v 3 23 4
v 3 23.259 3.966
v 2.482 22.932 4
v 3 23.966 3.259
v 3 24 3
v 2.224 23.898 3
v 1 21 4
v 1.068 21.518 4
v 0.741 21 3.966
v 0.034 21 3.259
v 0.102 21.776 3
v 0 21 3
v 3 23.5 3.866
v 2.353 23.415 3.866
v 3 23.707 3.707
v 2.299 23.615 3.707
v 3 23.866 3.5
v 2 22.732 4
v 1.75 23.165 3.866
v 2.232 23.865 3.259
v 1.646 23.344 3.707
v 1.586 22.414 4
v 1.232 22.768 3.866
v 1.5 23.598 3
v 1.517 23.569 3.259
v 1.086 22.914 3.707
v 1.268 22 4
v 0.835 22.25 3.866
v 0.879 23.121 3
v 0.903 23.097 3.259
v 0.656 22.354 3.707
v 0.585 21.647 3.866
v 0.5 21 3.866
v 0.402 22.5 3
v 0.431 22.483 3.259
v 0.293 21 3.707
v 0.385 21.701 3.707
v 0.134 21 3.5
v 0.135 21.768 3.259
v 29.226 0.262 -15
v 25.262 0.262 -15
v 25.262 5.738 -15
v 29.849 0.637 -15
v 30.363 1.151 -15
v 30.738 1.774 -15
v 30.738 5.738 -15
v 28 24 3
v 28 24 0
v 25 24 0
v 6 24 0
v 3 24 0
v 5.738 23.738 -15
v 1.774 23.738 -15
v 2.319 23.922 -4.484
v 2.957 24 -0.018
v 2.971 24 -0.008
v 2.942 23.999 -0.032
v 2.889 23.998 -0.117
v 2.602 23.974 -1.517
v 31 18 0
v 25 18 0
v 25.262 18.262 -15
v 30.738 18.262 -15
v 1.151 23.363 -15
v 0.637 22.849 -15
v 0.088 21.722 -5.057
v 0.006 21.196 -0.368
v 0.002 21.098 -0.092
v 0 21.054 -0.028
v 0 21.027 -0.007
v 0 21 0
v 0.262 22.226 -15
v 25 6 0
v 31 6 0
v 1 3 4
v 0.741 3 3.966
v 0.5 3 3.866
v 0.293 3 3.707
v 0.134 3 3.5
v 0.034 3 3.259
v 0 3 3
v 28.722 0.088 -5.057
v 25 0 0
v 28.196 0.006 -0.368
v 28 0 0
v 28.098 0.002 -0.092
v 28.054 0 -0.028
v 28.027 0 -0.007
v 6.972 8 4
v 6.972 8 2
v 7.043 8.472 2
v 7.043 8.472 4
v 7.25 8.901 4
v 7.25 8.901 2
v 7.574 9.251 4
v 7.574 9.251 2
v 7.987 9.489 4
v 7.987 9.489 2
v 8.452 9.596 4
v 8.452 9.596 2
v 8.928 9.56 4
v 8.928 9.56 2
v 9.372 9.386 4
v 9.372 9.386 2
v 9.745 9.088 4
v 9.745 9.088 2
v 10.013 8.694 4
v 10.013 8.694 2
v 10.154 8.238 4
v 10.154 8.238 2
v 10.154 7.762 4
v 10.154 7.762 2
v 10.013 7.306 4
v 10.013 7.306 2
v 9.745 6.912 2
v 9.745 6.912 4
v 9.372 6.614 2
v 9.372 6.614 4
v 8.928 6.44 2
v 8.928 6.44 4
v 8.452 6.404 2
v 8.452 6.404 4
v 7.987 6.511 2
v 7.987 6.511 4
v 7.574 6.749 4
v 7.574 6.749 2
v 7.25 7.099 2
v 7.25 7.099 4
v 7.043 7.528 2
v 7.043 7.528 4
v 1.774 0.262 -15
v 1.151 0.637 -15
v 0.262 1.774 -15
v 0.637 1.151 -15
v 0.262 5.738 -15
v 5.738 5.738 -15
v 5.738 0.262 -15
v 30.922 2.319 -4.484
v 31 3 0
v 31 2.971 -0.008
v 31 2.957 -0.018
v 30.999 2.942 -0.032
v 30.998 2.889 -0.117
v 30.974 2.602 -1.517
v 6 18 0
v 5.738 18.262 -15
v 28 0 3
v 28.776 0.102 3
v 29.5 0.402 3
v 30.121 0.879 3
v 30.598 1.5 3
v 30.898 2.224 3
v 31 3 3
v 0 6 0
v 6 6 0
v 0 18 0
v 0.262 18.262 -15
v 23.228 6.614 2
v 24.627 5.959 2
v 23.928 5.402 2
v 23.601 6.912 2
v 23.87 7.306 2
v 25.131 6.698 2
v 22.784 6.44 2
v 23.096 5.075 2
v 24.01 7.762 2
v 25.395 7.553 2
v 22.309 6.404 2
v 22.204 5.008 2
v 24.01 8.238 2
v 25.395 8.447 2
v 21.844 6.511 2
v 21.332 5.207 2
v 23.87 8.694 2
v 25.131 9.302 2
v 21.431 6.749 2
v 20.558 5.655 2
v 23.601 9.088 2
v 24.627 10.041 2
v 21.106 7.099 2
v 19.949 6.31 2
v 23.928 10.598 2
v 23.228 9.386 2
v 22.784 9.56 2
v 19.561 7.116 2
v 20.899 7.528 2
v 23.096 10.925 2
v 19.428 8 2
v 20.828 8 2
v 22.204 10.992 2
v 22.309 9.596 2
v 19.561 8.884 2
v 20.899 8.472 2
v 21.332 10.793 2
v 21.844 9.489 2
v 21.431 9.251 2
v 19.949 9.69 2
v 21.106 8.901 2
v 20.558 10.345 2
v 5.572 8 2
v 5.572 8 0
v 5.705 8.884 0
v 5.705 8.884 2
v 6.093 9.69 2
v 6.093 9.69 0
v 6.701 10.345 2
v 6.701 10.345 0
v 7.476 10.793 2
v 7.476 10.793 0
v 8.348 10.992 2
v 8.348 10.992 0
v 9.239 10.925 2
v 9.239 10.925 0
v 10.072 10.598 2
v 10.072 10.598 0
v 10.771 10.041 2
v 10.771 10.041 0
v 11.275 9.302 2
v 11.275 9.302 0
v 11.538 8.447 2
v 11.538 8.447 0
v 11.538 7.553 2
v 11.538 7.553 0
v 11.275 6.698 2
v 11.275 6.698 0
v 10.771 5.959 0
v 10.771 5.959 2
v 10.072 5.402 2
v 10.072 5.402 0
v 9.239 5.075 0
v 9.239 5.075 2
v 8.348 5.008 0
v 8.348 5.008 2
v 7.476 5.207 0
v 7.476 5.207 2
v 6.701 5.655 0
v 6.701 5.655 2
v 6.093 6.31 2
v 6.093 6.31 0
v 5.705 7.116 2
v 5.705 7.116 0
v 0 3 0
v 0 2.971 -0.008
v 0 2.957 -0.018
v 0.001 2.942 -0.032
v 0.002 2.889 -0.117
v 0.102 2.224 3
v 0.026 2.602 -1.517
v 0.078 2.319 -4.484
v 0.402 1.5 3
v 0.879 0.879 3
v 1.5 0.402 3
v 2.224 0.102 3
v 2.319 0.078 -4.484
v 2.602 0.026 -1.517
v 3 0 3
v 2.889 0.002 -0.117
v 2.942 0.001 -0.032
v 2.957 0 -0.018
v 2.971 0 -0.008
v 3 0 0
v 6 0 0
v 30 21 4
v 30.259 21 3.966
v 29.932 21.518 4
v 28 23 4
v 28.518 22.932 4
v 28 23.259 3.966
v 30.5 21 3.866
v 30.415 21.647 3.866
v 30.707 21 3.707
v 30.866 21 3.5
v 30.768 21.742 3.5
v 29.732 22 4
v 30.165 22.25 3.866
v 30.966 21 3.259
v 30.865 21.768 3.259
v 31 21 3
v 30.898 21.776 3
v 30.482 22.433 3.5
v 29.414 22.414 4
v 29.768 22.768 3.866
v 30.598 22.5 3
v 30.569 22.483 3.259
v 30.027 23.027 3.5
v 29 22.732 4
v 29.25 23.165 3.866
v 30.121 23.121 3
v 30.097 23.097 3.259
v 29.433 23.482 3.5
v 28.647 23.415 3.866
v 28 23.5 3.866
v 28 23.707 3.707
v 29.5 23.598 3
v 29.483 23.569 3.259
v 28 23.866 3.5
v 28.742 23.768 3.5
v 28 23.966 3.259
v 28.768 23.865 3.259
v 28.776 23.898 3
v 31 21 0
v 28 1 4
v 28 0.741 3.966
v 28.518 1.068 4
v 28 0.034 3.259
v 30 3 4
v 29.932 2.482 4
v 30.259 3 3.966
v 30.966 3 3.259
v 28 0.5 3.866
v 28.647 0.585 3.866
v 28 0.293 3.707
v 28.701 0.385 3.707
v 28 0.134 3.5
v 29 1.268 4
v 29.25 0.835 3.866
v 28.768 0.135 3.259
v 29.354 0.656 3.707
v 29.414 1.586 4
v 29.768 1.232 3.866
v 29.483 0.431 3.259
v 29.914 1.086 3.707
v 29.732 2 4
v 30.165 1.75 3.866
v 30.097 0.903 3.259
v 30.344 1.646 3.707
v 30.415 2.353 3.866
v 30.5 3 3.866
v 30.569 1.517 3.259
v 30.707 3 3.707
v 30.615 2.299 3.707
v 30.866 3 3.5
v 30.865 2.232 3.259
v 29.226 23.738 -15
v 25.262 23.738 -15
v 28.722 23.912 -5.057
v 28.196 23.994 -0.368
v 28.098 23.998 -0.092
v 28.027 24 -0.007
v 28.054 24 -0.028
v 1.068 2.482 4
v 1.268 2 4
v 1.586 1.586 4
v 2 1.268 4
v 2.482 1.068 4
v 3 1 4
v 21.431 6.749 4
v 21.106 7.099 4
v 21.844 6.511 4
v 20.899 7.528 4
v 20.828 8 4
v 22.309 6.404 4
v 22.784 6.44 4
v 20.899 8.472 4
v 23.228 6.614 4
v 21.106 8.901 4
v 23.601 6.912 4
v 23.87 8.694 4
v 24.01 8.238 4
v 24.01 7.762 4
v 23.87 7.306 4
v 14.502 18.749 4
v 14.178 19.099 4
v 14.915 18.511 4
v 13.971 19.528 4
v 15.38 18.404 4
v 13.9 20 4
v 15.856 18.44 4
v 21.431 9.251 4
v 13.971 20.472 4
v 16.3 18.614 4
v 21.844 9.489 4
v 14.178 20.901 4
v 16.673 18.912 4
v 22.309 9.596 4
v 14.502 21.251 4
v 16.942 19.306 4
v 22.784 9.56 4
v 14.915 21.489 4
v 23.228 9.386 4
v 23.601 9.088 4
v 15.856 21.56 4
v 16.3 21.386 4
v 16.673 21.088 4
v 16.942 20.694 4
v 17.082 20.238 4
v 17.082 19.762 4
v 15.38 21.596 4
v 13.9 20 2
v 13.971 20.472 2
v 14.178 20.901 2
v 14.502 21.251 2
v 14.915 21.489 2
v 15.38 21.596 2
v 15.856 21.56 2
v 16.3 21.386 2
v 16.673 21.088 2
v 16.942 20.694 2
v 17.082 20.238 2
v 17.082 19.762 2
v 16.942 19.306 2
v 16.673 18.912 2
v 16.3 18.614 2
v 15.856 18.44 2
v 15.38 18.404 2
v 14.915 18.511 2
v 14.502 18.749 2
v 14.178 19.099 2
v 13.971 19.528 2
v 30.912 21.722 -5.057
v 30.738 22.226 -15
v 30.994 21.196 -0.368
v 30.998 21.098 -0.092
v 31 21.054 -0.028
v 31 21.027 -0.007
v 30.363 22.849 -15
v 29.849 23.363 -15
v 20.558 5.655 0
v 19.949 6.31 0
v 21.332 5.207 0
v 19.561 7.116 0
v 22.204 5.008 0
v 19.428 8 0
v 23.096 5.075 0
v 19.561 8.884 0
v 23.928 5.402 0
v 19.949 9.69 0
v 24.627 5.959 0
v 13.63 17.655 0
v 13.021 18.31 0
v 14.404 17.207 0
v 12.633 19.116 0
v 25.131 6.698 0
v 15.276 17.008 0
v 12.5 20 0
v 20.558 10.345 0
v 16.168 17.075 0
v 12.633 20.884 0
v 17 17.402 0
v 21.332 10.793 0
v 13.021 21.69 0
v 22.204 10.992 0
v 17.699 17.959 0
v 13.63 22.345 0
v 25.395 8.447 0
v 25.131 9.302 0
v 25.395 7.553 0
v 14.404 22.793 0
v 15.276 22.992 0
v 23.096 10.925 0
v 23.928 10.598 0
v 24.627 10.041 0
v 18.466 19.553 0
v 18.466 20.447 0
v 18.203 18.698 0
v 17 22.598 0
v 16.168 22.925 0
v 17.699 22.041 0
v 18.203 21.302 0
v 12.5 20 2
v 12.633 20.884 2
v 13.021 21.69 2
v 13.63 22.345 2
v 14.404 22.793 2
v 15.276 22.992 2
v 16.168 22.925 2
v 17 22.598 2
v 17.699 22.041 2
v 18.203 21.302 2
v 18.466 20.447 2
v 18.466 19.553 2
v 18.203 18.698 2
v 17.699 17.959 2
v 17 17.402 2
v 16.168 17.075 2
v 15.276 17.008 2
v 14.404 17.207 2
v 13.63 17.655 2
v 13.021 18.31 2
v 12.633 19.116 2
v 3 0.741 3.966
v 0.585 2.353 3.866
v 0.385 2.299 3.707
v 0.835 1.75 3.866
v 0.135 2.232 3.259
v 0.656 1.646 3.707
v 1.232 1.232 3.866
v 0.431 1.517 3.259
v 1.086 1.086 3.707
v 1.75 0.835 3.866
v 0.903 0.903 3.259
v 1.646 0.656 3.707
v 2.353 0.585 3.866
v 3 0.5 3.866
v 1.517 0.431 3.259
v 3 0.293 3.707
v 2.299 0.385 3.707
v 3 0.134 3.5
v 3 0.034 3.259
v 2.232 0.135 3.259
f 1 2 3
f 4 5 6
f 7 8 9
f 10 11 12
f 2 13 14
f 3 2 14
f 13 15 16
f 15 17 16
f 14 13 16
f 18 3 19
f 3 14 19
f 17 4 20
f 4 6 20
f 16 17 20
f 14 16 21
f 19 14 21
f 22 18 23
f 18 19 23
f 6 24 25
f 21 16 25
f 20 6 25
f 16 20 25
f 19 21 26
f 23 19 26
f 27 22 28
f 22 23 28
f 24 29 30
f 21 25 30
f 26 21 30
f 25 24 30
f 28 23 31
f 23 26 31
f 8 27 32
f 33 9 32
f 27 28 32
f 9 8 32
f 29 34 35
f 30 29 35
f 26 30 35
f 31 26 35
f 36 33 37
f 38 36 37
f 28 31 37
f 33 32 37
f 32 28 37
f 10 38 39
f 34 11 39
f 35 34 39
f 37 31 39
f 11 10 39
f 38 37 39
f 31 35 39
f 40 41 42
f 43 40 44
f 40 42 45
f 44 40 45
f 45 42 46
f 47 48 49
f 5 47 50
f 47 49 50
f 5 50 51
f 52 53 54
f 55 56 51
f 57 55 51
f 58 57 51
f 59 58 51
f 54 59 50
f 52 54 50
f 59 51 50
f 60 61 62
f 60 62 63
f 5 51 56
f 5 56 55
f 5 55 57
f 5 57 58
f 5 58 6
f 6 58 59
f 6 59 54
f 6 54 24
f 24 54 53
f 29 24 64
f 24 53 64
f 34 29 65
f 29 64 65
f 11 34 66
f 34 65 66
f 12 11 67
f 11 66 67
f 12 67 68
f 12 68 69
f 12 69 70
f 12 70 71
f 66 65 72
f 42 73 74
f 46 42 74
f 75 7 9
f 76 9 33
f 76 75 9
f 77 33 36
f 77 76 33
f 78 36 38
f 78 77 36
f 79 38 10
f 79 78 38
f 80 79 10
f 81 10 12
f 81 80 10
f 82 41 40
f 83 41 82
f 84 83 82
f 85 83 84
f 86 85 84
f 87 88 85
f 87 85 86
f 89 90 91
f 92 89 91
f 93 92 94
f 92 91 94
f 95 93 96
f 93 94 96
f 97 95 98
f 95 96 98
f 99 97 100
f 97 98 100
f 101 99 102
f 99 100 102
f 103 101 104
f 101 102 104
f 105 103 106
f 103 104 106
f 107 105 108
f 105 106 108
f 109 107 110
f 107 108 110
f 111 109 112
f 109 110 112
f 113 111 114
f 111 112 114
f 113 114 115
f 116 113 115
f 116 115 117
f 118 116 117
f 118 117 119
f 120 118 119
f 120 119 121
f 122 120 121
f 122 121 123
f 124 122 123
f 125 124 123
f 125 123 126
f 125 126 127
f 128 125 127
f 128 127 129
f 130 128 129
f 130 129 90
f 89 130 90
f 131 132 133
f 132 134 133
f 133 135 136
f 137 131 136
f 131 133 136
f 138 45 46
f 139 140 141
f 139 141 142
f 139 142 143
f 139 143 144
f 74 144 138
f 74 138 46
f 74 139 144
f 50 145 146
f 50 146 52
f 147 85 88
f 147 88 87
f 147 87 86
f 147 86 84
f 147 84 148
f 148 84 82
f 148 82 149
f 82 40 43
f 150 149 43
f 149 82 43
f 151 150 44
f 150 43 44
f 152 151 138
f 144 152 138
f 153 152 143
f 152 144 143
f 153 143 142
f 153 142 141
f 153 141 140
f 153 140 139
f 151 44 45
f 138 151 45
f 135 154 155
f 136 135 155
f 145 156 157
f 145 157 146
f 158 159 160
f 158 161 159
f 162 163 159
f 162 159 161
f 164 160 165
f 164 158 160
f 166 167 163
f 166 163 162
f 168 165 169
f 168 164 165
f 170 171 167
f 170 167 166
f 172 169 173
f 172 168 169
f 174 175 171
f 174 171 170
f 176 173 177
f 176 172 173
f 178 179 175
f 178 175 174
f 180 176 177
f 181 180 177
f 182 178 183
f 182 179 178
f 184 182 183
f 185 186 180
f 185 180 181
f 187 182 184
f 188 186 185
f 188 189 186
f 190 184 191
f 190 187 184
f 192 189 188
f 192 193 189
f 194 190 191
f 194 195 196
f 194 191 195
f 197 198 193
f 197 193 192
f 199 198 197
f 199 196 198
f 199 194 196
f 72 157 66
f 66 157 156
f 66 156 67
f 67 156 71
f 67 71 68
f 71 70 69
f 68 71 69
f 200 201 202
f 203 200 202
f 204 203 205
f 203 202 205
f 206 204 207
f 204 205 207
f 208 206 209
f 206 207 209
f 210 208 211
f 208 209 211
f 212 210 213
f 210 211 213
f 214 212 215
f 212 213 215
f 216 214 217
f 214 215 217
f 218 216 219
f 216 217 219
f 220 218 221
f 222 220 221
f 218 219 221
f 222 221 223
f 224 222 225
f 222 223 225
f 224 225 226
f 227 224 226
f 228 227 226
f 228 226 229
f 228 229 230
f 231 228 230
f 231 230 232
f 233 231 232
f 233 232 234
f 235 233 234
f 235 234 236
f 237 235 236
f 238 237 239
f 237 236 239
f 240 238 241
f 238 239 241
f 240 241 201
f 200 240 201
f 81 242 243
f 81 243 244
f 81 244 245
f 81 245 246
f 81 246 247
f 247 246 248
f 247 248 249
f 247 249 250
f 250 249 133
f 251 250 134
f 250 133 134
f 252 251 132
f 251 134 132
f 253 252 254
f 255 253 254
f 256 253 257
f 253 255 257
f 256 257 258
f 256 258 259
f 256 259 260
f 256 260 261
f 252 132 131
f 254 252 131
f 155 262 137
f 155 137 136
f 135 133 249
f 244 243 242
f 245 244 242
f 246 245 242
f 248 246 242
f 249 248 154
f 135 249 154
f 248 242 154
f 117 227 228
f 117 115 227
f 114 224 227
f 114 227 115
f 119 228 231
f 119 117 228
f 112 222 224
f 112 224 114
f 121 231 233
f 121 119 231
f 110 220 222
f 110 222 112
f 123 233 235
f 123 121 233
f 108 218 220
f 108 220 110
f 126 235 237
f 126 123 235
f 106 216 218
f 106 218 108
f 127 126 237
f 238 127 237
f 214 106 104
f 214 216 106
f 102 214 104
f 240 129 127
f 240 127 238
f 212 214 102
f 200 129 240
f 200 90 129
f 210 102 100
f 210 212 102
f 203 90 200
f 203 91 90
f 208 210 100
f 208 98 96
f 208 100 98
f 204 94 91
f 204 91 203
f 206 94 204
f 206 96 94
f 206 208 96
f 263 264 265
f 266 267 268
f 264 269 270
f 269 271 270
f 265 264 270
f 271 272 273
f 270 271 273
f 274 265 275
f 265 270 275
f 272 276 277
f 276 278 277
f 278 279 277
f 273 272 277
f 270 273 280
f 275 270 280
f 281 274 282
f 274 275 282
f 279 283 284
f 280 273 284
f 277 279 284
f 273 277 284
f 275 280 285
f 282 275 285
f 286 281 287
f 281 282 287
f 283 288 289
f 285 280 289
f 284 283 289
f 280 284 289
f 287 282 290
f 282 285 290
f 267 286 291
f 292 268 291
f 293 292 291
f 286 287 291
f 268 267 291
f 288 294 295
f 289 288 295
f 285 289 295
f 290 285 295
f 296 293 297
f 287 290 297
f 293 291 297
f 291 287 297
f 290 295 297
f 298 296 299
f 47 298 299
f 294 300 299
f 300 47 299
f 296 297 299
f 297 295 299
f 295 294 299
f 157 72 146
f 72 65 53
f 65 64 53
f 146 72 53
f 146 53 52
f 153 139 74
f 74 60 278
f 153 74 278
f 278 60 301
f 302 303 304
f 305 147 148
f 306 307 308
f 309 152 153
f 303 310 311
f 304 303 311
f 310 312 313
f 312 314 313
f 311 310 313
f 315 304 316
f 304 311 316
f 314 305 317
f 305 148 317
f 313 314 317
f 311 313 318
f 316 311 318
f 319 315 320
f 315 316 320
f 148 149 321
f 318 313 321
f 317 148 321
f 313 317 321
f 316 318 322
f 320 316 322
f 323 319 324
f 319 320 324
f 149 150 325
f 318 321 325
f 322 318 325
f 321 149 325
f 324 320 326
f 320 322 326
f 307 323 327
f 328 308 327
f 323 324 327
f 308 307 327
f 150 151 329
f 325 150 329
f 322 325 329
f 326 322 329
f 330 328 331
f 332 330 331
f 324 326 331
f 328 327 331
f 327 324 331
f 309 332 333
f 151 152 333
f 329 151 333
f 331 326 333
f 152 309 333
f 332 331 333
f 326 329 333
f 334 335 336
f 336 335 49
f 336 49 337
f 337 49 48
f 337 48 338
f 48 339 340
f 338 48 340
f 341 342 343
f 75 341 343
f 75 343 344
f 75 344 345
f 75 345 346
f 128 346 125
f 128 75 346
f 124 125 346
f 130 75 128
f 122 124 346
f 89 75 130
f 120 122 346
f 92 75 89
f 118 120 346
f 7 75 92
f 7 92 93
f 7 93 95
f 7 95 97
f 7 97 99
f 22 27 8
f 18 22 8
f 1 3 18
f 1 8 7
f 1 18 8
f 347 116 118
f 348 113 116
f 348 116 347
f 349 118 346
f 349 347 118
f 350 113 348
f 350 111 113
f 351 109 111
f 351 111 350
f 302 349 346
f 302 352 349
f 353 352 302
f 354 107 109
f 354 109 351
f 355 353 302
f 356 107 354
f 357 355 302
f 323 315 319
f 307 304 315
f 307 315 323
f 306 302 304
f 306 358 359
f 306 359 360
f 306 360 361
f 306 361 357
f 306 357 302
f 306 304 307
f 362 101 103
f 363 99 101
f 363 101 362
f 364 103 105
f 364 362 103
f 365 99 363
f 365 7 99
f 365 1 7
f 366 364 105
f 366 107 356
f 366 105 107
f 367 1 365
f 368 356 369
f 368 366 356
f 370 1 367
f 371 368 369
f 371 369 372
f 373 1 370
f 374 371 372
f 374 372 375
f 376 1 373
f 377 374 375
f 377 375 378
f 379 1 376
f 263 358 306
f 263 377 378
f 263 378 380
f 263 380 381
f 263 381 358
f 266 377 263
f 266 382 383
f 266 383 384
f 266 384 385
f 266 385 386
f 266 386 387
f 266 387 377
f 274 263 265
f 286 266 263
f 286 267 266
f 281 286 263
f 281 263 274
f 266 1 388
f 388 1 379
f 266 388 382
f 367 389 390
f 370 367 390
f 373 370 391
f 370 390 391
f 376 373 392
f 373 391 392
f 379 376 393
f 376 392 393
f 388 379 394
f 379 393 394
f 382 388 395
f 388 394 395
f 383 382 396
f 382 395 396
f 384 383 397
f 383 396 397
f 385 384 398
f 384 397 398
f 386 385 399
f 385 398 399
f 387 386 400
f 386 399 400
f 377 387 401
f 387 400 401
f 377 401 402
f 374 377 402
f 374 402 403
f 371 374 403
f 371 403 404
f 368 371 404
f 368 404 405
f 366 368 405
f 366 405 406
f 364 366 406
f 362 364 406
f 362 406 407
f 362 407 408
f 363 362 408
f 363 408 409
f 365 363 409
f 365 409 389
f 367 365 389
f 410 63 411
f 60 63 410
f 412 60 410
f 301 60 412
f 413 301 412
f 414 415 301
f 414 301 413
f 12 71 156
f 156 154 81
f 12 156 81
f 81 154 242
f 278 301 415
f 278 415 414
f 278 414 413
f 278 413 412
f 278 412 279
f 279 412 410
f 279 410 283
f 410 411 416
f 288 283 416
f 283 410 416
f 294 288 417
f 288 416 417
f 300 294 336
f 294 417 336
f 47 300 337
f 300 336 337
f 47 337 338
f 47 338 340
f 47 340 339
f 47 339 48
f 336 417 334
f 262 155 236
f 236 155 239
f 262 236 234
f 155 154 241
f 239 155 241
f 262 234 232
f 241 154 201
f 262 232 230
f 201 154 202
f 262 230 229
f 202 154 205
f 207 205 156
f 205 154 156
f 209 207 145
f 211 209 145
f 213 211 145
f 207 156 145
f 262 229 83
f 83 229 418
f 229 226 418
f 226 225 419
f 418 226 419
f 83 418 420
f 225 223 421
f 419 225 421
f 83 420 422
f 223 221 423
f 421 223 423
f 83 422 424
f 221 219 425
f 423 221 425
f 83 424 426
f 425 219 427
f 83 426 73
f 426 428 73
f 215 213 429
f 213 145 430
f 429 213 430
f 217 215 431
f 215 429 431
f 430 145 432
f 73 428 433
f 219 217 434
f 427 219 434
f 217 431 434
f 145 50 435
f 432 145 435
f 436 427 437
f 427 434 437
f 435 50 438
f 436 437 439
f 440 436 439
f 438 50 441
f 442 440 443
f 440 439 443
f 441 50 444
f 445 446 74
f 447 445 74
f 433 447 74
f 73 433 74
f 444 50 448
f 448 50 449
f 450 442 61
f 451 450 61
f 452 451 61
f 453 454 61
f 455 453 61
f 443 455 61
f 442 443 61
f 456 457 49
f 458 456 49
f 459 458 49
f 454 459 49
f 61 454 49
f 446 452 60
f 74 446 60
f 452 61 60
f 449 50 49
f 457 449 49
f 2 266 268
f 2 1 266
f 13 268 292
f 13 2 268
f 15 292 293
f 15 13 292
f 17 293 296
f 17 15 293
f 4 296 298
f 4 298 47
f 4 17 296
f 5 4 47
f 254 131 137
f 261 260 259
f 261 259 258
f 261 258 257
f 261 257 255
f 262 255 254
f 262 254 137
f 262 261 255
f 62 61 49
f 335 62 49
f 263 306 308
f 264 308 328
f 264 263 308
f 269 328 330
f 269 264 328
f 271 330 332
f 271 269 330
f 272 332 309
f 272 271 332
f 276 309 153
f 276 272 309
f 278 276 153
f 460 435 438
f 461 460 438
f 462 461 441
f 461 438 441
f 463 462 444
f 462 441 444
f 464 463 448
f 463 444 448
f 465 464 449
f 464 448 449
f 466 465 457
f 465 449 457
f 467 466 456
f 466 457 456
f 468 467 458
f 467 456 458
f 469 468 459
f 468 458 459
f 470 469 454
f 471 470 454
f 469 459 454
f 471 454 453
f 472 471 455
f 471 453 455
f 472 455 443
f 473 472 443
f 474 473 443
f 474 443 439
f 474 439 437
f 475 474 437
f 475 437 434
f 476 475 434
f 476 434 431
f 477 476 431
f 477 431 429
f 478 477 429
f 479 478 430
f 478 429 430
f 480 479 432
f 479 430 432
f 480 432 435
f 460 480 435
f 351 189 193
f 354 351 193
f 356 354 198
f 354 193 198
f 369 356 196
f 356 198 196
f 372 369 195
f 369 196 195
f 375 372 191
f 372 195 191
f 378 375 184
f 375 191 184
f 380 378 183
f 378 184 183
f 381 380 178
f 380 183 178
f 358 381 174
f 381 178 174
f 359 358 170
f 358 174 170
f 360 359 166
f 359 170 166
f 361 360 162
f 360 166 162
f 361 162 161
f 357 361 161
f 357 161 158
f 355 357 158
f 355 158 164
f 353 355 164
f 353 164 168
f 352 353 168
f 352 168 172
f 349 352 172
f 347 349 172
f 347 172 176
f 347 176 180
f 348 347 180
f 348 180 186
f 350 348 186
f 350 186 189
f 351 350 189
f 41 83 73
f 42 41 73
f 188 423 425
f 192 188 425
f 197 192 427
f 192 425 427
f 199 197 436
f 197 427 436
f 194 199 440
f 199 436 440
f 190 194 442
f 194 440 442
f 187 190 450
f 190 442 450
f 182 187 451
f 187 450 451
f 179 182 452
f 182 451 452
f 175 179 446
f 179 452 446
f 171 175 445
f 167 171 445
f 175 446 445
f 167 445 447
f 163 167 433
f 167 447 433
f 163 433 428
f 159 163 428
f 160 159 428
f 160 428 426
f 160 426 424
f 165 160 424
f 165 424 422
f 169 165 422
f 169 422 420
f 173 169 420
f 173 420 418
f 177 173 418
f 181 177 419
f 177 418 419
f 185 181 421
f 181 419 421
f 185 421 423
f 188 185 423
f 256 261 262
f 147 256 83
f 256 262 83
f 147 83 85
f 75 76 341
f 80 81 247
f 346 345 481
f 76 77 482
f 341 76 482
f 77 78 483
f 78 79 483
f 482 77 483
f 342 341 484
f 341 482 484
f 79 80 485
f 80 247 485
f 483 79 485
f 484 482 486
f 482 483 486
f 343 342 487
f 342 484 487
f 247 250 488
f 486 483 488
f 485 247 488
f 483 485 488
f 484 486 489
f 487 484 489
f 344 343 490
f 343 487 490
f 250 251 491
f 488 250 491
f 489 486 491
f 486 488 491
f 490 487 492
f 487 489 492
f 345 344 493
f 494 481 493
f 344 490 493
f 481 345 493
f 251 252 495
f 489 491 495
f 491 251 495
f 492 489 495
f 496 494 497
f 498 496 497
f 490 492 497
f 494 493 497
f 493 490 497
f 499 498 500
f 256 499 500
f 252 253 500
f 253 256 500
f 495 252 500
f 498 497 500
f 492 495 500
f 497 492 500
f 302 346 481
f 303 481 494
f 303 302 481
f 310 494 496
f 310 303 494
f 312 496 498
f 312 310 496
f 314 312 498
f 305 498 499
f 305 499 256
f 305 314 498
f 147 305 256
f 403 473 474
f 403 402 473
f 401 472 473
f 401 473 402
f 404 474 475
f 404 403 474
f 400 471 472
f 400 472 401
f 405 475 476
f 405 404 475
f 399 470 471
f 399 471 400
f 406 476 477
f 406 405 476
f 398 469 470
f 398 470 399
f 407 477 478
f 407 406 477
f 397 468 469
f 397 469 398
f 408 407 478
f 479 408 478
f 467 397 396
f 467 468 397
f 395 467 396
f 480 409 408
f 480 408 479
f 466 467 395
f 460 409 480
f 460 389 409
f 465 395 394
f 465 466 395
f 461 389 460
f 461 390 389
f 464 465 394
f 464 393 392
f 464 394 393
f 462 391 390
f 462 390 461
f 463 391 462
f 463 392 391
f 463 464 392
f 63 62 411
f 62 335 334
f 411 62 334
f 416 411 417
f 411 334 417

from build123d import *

# Parameters (mm, degrees)
SKETCH1_W                     = 6
SKETCH1_H                     = 6
BOSS_EXTRUDE1_DEPTH           = 4
SKETCH1_3_W                   = 6
SKETCH1_3_H                   = 6
BOSS_EXTRUDE2_DEPTH           = 15
BOSS_EXTRUDE2_DRAFT           = -1
BOSS_EXTRUDE2_PROFILE_2_DEPTH = 15
BOSS_EXTRUDE2_PROFILE_2_DRAFT = -1
BOSS_EXTRUDE2_PROFILE_3_DEPTH = 15
BOSS_EXTRUDE2_PROFILE_3_DRAFT = -1
BOSS_EXTRUDE2_PROFILE_4_DEPTH = 15
BOSS_EXTRUDE2_PROFILE_4_DRAFT = -1
SKETCH2_R                     = 1.6
CUT_EXTRUDE1_DEPTH            = 42.976183724
SKETCH3_R                     = 3
CUT_EXTRUDE2_DEPTH            = 2
FILLET1_R                     = 3
FILLET2_R                     = 1


with BuildPart() as part:
    # Sketch1 → Boss-Extrude1 (new body)
    with BuildSketch(Plane.XY):
        Polygon((6, 6), (6, 0), (25, 0), (25, 6), (31, 6), (31, 18), (25, 18), (25, 24), (6, 24), (6, 18), (0, 18), (0, 6), align=None)
        with Locations((3, 21)):
            Rectangle(SKETCH1_W, SKETCH1_H)
        with Locations((3, 3)):
            Rectangle(SKETCH1_W, SKETCH1_H)
        with Locations((28, 21)):
            Rectangle(SKETCH1_W, SKETCH1_H)
        with Locations((28, 3)):
            Rectangle(SKETCH1_W, SKETCH1_H)
    extrude(amount=BOSS_EXTRUDE1_DEPTH)


with BuildPart() as boss_extrude2_tool:
    # Sketch1<3> → Boss-Extrude2 (with draft: the straight prism first)
    with BuildSketch(Plane.XY):
        with Locations((3, 21)):
            Rectangle(SKETCH1_3_W, SKETCH1_3_H)
    extrude(amount=-BOSS_EXTRUDE2_DEPTH)
    # Boss-Extrude2: the draft: its side faces are tilted about the plane it starts from
    boss_extrude2_sides = [boss_extrude2_tool.faces().sort_by_distance(p)[0] for p in [
        (3, 24, -7.5),
        (0, 21, -7.5),
        (3, 18, -7.5),
        (6, 21, -7.5),
    ]]
    draft(boss_extrude2_sides, Plane.XY, BOSS_EXTRUDE2_DRAFT)


with BuildPart() as part_1:
    add(part.part)

    # Boss-Extrude2: add boss_extrude2_tool
    add(boss_extrude2_tool.part)


with BuildPart() as boss_extrude2_profile_2_tool:
    # Sketch1<3> → Boss-Extrude2 profile 2 (with draft: the straight prism first)
    with BuildSketch(Plane.XY):
        with Locations((28, 21)):
            Rectangle(SKETCH1_3_W, SKETCH1_3_H)
    extrude(amount=-BOSS_EXTRUDE2_PROFILE_2_DEPTH)
    # Boss-Extrude2 profile 2: the draft: its side faces are tilted about the plane it starts from
    boss_extrude2_profile_2_sides = [boss_extrude2_profile_2_tool.faces().sort_by_distance(p)[0] for p in [
        (28, 18, -7.5),
        (31, 21, -7.5),
        (28, 24, -7.5),
        (25, 21, -7.5),
    ]]
    draft(boss_extrude2_profile_2_sides, Plane.XY, BOSS_EXTRUDE2_PROFILE_2_DRAFT)


with BuildPart() as part_2:
    add(part_1.part)

    # Boss-Extrude2 profile 2: add boss_extrude2_profile_2_tool
    add(boss_extrude2_profile_2_tool.part)


with BuildPart() as boss_extrude2_profile_3_tool:
    # Sketch1<3> → Boss-Extrude2 profile 3 (with draft: the straight prism first)
    with BuildSketch(Plane.XY):
        with Locations((28, 3)):
            Rectangle(SKETCH1_3_W, SKETCH1_3_H)
    extrude(amount=-BOSS_EXTRUDE2_PROFILE_3_DEPTH)
    # Boss-Extrude2 profile 3: the draft: its side faces are tilted about the plane it starts from
    boss_extrude2_profile_3_sides = [boss_extrude2_profile_3_tool.faces().sort_by_distance(p)[0] for p in [
        (28, 0, -7.5),
        (31, 3, -7.5),
        (28, 6, -7.5),
        (25, 3, -7.5),
    ]]
    draft(boss_extrude2_profile_3_sides, Plane.XY, BOSS_EXTRUDE2_PROFILE_3_DRAFT)


with BuildPart() as part_3:
    add(part_2.part)

    # Boss-Extrude2 profile 3: add boss_extrude2_profile_3_tool
    add(boss_extrude2_profile_3_tool.part)


with BuildPart() as boss_extrude2_profile_4_tool:
    # Sketch1<3> → Boss-Extrude2 profile 4 (with draft: the straight prism first)
    with BuildSketch(Plane.XY):
        with Locations((3, 3)):
            Rectangle(SKETCH1_3_W, SKETCH1_3_H)
    extrude(amount=-BOSS_EXTRUDE2_PROFILE_4_DEPTH)
    # Boss-Extrude2 profile 4: the draft: its side faces are tilted about the plane it starts from
    boss_extrude2_profile_4_sides = [boss_extrude2_profile_4_tool.faces().sort_by_distance(p)[0] for p in [
        (0, 3, -7.5),
        (3, 0, -7.5),
        (6, 3, -7.5),
        (3, 6, -7.5),
    ]]
    draft(boss_extrude2_profile_4_sides, Plane.XY, BOSS_EXTRUDE2_PROFILE_4_DRAFT)


with BuildPart() as part_4:
    add(part_3.part)

    # Boss-Extrude2 profile 4: add boss_extrude2_profile_4_tool
    add(boss_extrude2_profile_4_tool.part)

    # Sketch2 → Cut-Extrude1 (cut, through all)
    with BuildSketch(Plane(origin=(0, 0, 0), x_dir=(-1, 0, 0), z_dir=(0, 0, -1))):
        with Locations((-22.42820323, 8)):
            Circle(SKETCH2_R)
        with Locations((-15.5, 20)):
            Circle(SKETCH2_R)
        with Locations((-8.57179677, 8)):
            Circle(SKETCH2_R)
    extrude(amount=-CUT_EXTRUDE1_DEPTH, mode=Mode.SUBTRACT)

    # Sketch3 → Cut-Extrude2 (cut)
    with BuildSketch(Plane(origin=(0, 0, 0), x_dir=(-1, 0, 0), z_dir=(0, 0, -1))):
        with Locations((-15.5, 20)):
            Circle(SKETCH3_R)
        with Locations((-8.57179677, 8)):
            Circle(SKETCH3_R)
        with Locations((-22.42820323, 8)):
            Circle(SKETCH3_R)
    extrude(amount=-CUT_EXTRUDE2_DEPTH, mode=Mode.SUBTRACT)

    # Fillet1
    # the kernel refuses this fillet: 3 mm, written as the material it takes off along each edge
    with BuildSketch(Plane(origin=(31, 24, -18), x_dir=(-1, 0, 0), z_dir=(0, 0, 1)), Plane(origin=(31, 0, -18), x_dir=(0, 1, 0), z_dir=(0, 0, 1))) as fillet1_piece_1:
        with BuildLine():
            CenterArc((FILLET1_R, FILLET1_R), FILLET1_R, 180, 90)
            Line((0, FILLET1_R), (-FILLET1_R * 0.02, FILLET1_R))
            Line((-FILLET1_R * 0.02, FILLET1_R), (-FILLET1_R * 0.02, -FILLET1_R * 0.02))
            Line((-FILLET1_R * 0.02, -FILLET1_R * 0.02), (FILLET1_R, -FILLET1_R * 0.02))
            Line((FILLET1_R, -FILLET1_R * 0.02), (FILLET1_R, 0))
        make_face()
    extrude(amount=40, mode=Mode.SUBTRACT)
    with BuildSketch(Plane(origin=(0, 0, -18), x_dir=(0, 1, 0), z_dir=(0, 0, 1)), Plane(origin=(0, 24, -18), x_dir=(1, 0, 0), z_dir=(0, 0, 1))) as fillet1_piece_2:
        with BuildLine():
            CenterArc((FILLET1_R, -FILLET1_R), FILLET1_R, 90, 90)
            Line((0, -FILLET1_R), (-FILLET1_R * 0.02, -FILLET1_R))
            Line((-FILLET1_R * 0.02, -FILLET1_R), (-FILLET1_R * 0.02, FILLET1_R * 0.02))
            Line((-FILLET1_R * 0.02, FILLET1_R * 0.02), (FILLET1_R, FILLET1_R * 0.02))
            Line((FILLET1_R, FILLET1_R * 0.02), (FILLET1_R, 0))
        make_face()
    extrude(amount=40, mode=Mode.SUBTRACT)

    # Fillet2
    fillet2_edges = [part_4.edges().sort_by_distance(p)[0] for p in [
        (15.5, 24, 4),
        (31, 12, 4),
        (0, 12, 4),
        (15.5, 0, 4),
        (0.878679656, 23.121320344, 4),
        (0.878679656, 0.878679656, 4),
        (30.121320344, 0.878679656, 4),
        (30.121320344, 23.121320344, 4),
    ]]
    fillet(fillet2_edges, radius=FILLET2_R)


solid = part_4.part
